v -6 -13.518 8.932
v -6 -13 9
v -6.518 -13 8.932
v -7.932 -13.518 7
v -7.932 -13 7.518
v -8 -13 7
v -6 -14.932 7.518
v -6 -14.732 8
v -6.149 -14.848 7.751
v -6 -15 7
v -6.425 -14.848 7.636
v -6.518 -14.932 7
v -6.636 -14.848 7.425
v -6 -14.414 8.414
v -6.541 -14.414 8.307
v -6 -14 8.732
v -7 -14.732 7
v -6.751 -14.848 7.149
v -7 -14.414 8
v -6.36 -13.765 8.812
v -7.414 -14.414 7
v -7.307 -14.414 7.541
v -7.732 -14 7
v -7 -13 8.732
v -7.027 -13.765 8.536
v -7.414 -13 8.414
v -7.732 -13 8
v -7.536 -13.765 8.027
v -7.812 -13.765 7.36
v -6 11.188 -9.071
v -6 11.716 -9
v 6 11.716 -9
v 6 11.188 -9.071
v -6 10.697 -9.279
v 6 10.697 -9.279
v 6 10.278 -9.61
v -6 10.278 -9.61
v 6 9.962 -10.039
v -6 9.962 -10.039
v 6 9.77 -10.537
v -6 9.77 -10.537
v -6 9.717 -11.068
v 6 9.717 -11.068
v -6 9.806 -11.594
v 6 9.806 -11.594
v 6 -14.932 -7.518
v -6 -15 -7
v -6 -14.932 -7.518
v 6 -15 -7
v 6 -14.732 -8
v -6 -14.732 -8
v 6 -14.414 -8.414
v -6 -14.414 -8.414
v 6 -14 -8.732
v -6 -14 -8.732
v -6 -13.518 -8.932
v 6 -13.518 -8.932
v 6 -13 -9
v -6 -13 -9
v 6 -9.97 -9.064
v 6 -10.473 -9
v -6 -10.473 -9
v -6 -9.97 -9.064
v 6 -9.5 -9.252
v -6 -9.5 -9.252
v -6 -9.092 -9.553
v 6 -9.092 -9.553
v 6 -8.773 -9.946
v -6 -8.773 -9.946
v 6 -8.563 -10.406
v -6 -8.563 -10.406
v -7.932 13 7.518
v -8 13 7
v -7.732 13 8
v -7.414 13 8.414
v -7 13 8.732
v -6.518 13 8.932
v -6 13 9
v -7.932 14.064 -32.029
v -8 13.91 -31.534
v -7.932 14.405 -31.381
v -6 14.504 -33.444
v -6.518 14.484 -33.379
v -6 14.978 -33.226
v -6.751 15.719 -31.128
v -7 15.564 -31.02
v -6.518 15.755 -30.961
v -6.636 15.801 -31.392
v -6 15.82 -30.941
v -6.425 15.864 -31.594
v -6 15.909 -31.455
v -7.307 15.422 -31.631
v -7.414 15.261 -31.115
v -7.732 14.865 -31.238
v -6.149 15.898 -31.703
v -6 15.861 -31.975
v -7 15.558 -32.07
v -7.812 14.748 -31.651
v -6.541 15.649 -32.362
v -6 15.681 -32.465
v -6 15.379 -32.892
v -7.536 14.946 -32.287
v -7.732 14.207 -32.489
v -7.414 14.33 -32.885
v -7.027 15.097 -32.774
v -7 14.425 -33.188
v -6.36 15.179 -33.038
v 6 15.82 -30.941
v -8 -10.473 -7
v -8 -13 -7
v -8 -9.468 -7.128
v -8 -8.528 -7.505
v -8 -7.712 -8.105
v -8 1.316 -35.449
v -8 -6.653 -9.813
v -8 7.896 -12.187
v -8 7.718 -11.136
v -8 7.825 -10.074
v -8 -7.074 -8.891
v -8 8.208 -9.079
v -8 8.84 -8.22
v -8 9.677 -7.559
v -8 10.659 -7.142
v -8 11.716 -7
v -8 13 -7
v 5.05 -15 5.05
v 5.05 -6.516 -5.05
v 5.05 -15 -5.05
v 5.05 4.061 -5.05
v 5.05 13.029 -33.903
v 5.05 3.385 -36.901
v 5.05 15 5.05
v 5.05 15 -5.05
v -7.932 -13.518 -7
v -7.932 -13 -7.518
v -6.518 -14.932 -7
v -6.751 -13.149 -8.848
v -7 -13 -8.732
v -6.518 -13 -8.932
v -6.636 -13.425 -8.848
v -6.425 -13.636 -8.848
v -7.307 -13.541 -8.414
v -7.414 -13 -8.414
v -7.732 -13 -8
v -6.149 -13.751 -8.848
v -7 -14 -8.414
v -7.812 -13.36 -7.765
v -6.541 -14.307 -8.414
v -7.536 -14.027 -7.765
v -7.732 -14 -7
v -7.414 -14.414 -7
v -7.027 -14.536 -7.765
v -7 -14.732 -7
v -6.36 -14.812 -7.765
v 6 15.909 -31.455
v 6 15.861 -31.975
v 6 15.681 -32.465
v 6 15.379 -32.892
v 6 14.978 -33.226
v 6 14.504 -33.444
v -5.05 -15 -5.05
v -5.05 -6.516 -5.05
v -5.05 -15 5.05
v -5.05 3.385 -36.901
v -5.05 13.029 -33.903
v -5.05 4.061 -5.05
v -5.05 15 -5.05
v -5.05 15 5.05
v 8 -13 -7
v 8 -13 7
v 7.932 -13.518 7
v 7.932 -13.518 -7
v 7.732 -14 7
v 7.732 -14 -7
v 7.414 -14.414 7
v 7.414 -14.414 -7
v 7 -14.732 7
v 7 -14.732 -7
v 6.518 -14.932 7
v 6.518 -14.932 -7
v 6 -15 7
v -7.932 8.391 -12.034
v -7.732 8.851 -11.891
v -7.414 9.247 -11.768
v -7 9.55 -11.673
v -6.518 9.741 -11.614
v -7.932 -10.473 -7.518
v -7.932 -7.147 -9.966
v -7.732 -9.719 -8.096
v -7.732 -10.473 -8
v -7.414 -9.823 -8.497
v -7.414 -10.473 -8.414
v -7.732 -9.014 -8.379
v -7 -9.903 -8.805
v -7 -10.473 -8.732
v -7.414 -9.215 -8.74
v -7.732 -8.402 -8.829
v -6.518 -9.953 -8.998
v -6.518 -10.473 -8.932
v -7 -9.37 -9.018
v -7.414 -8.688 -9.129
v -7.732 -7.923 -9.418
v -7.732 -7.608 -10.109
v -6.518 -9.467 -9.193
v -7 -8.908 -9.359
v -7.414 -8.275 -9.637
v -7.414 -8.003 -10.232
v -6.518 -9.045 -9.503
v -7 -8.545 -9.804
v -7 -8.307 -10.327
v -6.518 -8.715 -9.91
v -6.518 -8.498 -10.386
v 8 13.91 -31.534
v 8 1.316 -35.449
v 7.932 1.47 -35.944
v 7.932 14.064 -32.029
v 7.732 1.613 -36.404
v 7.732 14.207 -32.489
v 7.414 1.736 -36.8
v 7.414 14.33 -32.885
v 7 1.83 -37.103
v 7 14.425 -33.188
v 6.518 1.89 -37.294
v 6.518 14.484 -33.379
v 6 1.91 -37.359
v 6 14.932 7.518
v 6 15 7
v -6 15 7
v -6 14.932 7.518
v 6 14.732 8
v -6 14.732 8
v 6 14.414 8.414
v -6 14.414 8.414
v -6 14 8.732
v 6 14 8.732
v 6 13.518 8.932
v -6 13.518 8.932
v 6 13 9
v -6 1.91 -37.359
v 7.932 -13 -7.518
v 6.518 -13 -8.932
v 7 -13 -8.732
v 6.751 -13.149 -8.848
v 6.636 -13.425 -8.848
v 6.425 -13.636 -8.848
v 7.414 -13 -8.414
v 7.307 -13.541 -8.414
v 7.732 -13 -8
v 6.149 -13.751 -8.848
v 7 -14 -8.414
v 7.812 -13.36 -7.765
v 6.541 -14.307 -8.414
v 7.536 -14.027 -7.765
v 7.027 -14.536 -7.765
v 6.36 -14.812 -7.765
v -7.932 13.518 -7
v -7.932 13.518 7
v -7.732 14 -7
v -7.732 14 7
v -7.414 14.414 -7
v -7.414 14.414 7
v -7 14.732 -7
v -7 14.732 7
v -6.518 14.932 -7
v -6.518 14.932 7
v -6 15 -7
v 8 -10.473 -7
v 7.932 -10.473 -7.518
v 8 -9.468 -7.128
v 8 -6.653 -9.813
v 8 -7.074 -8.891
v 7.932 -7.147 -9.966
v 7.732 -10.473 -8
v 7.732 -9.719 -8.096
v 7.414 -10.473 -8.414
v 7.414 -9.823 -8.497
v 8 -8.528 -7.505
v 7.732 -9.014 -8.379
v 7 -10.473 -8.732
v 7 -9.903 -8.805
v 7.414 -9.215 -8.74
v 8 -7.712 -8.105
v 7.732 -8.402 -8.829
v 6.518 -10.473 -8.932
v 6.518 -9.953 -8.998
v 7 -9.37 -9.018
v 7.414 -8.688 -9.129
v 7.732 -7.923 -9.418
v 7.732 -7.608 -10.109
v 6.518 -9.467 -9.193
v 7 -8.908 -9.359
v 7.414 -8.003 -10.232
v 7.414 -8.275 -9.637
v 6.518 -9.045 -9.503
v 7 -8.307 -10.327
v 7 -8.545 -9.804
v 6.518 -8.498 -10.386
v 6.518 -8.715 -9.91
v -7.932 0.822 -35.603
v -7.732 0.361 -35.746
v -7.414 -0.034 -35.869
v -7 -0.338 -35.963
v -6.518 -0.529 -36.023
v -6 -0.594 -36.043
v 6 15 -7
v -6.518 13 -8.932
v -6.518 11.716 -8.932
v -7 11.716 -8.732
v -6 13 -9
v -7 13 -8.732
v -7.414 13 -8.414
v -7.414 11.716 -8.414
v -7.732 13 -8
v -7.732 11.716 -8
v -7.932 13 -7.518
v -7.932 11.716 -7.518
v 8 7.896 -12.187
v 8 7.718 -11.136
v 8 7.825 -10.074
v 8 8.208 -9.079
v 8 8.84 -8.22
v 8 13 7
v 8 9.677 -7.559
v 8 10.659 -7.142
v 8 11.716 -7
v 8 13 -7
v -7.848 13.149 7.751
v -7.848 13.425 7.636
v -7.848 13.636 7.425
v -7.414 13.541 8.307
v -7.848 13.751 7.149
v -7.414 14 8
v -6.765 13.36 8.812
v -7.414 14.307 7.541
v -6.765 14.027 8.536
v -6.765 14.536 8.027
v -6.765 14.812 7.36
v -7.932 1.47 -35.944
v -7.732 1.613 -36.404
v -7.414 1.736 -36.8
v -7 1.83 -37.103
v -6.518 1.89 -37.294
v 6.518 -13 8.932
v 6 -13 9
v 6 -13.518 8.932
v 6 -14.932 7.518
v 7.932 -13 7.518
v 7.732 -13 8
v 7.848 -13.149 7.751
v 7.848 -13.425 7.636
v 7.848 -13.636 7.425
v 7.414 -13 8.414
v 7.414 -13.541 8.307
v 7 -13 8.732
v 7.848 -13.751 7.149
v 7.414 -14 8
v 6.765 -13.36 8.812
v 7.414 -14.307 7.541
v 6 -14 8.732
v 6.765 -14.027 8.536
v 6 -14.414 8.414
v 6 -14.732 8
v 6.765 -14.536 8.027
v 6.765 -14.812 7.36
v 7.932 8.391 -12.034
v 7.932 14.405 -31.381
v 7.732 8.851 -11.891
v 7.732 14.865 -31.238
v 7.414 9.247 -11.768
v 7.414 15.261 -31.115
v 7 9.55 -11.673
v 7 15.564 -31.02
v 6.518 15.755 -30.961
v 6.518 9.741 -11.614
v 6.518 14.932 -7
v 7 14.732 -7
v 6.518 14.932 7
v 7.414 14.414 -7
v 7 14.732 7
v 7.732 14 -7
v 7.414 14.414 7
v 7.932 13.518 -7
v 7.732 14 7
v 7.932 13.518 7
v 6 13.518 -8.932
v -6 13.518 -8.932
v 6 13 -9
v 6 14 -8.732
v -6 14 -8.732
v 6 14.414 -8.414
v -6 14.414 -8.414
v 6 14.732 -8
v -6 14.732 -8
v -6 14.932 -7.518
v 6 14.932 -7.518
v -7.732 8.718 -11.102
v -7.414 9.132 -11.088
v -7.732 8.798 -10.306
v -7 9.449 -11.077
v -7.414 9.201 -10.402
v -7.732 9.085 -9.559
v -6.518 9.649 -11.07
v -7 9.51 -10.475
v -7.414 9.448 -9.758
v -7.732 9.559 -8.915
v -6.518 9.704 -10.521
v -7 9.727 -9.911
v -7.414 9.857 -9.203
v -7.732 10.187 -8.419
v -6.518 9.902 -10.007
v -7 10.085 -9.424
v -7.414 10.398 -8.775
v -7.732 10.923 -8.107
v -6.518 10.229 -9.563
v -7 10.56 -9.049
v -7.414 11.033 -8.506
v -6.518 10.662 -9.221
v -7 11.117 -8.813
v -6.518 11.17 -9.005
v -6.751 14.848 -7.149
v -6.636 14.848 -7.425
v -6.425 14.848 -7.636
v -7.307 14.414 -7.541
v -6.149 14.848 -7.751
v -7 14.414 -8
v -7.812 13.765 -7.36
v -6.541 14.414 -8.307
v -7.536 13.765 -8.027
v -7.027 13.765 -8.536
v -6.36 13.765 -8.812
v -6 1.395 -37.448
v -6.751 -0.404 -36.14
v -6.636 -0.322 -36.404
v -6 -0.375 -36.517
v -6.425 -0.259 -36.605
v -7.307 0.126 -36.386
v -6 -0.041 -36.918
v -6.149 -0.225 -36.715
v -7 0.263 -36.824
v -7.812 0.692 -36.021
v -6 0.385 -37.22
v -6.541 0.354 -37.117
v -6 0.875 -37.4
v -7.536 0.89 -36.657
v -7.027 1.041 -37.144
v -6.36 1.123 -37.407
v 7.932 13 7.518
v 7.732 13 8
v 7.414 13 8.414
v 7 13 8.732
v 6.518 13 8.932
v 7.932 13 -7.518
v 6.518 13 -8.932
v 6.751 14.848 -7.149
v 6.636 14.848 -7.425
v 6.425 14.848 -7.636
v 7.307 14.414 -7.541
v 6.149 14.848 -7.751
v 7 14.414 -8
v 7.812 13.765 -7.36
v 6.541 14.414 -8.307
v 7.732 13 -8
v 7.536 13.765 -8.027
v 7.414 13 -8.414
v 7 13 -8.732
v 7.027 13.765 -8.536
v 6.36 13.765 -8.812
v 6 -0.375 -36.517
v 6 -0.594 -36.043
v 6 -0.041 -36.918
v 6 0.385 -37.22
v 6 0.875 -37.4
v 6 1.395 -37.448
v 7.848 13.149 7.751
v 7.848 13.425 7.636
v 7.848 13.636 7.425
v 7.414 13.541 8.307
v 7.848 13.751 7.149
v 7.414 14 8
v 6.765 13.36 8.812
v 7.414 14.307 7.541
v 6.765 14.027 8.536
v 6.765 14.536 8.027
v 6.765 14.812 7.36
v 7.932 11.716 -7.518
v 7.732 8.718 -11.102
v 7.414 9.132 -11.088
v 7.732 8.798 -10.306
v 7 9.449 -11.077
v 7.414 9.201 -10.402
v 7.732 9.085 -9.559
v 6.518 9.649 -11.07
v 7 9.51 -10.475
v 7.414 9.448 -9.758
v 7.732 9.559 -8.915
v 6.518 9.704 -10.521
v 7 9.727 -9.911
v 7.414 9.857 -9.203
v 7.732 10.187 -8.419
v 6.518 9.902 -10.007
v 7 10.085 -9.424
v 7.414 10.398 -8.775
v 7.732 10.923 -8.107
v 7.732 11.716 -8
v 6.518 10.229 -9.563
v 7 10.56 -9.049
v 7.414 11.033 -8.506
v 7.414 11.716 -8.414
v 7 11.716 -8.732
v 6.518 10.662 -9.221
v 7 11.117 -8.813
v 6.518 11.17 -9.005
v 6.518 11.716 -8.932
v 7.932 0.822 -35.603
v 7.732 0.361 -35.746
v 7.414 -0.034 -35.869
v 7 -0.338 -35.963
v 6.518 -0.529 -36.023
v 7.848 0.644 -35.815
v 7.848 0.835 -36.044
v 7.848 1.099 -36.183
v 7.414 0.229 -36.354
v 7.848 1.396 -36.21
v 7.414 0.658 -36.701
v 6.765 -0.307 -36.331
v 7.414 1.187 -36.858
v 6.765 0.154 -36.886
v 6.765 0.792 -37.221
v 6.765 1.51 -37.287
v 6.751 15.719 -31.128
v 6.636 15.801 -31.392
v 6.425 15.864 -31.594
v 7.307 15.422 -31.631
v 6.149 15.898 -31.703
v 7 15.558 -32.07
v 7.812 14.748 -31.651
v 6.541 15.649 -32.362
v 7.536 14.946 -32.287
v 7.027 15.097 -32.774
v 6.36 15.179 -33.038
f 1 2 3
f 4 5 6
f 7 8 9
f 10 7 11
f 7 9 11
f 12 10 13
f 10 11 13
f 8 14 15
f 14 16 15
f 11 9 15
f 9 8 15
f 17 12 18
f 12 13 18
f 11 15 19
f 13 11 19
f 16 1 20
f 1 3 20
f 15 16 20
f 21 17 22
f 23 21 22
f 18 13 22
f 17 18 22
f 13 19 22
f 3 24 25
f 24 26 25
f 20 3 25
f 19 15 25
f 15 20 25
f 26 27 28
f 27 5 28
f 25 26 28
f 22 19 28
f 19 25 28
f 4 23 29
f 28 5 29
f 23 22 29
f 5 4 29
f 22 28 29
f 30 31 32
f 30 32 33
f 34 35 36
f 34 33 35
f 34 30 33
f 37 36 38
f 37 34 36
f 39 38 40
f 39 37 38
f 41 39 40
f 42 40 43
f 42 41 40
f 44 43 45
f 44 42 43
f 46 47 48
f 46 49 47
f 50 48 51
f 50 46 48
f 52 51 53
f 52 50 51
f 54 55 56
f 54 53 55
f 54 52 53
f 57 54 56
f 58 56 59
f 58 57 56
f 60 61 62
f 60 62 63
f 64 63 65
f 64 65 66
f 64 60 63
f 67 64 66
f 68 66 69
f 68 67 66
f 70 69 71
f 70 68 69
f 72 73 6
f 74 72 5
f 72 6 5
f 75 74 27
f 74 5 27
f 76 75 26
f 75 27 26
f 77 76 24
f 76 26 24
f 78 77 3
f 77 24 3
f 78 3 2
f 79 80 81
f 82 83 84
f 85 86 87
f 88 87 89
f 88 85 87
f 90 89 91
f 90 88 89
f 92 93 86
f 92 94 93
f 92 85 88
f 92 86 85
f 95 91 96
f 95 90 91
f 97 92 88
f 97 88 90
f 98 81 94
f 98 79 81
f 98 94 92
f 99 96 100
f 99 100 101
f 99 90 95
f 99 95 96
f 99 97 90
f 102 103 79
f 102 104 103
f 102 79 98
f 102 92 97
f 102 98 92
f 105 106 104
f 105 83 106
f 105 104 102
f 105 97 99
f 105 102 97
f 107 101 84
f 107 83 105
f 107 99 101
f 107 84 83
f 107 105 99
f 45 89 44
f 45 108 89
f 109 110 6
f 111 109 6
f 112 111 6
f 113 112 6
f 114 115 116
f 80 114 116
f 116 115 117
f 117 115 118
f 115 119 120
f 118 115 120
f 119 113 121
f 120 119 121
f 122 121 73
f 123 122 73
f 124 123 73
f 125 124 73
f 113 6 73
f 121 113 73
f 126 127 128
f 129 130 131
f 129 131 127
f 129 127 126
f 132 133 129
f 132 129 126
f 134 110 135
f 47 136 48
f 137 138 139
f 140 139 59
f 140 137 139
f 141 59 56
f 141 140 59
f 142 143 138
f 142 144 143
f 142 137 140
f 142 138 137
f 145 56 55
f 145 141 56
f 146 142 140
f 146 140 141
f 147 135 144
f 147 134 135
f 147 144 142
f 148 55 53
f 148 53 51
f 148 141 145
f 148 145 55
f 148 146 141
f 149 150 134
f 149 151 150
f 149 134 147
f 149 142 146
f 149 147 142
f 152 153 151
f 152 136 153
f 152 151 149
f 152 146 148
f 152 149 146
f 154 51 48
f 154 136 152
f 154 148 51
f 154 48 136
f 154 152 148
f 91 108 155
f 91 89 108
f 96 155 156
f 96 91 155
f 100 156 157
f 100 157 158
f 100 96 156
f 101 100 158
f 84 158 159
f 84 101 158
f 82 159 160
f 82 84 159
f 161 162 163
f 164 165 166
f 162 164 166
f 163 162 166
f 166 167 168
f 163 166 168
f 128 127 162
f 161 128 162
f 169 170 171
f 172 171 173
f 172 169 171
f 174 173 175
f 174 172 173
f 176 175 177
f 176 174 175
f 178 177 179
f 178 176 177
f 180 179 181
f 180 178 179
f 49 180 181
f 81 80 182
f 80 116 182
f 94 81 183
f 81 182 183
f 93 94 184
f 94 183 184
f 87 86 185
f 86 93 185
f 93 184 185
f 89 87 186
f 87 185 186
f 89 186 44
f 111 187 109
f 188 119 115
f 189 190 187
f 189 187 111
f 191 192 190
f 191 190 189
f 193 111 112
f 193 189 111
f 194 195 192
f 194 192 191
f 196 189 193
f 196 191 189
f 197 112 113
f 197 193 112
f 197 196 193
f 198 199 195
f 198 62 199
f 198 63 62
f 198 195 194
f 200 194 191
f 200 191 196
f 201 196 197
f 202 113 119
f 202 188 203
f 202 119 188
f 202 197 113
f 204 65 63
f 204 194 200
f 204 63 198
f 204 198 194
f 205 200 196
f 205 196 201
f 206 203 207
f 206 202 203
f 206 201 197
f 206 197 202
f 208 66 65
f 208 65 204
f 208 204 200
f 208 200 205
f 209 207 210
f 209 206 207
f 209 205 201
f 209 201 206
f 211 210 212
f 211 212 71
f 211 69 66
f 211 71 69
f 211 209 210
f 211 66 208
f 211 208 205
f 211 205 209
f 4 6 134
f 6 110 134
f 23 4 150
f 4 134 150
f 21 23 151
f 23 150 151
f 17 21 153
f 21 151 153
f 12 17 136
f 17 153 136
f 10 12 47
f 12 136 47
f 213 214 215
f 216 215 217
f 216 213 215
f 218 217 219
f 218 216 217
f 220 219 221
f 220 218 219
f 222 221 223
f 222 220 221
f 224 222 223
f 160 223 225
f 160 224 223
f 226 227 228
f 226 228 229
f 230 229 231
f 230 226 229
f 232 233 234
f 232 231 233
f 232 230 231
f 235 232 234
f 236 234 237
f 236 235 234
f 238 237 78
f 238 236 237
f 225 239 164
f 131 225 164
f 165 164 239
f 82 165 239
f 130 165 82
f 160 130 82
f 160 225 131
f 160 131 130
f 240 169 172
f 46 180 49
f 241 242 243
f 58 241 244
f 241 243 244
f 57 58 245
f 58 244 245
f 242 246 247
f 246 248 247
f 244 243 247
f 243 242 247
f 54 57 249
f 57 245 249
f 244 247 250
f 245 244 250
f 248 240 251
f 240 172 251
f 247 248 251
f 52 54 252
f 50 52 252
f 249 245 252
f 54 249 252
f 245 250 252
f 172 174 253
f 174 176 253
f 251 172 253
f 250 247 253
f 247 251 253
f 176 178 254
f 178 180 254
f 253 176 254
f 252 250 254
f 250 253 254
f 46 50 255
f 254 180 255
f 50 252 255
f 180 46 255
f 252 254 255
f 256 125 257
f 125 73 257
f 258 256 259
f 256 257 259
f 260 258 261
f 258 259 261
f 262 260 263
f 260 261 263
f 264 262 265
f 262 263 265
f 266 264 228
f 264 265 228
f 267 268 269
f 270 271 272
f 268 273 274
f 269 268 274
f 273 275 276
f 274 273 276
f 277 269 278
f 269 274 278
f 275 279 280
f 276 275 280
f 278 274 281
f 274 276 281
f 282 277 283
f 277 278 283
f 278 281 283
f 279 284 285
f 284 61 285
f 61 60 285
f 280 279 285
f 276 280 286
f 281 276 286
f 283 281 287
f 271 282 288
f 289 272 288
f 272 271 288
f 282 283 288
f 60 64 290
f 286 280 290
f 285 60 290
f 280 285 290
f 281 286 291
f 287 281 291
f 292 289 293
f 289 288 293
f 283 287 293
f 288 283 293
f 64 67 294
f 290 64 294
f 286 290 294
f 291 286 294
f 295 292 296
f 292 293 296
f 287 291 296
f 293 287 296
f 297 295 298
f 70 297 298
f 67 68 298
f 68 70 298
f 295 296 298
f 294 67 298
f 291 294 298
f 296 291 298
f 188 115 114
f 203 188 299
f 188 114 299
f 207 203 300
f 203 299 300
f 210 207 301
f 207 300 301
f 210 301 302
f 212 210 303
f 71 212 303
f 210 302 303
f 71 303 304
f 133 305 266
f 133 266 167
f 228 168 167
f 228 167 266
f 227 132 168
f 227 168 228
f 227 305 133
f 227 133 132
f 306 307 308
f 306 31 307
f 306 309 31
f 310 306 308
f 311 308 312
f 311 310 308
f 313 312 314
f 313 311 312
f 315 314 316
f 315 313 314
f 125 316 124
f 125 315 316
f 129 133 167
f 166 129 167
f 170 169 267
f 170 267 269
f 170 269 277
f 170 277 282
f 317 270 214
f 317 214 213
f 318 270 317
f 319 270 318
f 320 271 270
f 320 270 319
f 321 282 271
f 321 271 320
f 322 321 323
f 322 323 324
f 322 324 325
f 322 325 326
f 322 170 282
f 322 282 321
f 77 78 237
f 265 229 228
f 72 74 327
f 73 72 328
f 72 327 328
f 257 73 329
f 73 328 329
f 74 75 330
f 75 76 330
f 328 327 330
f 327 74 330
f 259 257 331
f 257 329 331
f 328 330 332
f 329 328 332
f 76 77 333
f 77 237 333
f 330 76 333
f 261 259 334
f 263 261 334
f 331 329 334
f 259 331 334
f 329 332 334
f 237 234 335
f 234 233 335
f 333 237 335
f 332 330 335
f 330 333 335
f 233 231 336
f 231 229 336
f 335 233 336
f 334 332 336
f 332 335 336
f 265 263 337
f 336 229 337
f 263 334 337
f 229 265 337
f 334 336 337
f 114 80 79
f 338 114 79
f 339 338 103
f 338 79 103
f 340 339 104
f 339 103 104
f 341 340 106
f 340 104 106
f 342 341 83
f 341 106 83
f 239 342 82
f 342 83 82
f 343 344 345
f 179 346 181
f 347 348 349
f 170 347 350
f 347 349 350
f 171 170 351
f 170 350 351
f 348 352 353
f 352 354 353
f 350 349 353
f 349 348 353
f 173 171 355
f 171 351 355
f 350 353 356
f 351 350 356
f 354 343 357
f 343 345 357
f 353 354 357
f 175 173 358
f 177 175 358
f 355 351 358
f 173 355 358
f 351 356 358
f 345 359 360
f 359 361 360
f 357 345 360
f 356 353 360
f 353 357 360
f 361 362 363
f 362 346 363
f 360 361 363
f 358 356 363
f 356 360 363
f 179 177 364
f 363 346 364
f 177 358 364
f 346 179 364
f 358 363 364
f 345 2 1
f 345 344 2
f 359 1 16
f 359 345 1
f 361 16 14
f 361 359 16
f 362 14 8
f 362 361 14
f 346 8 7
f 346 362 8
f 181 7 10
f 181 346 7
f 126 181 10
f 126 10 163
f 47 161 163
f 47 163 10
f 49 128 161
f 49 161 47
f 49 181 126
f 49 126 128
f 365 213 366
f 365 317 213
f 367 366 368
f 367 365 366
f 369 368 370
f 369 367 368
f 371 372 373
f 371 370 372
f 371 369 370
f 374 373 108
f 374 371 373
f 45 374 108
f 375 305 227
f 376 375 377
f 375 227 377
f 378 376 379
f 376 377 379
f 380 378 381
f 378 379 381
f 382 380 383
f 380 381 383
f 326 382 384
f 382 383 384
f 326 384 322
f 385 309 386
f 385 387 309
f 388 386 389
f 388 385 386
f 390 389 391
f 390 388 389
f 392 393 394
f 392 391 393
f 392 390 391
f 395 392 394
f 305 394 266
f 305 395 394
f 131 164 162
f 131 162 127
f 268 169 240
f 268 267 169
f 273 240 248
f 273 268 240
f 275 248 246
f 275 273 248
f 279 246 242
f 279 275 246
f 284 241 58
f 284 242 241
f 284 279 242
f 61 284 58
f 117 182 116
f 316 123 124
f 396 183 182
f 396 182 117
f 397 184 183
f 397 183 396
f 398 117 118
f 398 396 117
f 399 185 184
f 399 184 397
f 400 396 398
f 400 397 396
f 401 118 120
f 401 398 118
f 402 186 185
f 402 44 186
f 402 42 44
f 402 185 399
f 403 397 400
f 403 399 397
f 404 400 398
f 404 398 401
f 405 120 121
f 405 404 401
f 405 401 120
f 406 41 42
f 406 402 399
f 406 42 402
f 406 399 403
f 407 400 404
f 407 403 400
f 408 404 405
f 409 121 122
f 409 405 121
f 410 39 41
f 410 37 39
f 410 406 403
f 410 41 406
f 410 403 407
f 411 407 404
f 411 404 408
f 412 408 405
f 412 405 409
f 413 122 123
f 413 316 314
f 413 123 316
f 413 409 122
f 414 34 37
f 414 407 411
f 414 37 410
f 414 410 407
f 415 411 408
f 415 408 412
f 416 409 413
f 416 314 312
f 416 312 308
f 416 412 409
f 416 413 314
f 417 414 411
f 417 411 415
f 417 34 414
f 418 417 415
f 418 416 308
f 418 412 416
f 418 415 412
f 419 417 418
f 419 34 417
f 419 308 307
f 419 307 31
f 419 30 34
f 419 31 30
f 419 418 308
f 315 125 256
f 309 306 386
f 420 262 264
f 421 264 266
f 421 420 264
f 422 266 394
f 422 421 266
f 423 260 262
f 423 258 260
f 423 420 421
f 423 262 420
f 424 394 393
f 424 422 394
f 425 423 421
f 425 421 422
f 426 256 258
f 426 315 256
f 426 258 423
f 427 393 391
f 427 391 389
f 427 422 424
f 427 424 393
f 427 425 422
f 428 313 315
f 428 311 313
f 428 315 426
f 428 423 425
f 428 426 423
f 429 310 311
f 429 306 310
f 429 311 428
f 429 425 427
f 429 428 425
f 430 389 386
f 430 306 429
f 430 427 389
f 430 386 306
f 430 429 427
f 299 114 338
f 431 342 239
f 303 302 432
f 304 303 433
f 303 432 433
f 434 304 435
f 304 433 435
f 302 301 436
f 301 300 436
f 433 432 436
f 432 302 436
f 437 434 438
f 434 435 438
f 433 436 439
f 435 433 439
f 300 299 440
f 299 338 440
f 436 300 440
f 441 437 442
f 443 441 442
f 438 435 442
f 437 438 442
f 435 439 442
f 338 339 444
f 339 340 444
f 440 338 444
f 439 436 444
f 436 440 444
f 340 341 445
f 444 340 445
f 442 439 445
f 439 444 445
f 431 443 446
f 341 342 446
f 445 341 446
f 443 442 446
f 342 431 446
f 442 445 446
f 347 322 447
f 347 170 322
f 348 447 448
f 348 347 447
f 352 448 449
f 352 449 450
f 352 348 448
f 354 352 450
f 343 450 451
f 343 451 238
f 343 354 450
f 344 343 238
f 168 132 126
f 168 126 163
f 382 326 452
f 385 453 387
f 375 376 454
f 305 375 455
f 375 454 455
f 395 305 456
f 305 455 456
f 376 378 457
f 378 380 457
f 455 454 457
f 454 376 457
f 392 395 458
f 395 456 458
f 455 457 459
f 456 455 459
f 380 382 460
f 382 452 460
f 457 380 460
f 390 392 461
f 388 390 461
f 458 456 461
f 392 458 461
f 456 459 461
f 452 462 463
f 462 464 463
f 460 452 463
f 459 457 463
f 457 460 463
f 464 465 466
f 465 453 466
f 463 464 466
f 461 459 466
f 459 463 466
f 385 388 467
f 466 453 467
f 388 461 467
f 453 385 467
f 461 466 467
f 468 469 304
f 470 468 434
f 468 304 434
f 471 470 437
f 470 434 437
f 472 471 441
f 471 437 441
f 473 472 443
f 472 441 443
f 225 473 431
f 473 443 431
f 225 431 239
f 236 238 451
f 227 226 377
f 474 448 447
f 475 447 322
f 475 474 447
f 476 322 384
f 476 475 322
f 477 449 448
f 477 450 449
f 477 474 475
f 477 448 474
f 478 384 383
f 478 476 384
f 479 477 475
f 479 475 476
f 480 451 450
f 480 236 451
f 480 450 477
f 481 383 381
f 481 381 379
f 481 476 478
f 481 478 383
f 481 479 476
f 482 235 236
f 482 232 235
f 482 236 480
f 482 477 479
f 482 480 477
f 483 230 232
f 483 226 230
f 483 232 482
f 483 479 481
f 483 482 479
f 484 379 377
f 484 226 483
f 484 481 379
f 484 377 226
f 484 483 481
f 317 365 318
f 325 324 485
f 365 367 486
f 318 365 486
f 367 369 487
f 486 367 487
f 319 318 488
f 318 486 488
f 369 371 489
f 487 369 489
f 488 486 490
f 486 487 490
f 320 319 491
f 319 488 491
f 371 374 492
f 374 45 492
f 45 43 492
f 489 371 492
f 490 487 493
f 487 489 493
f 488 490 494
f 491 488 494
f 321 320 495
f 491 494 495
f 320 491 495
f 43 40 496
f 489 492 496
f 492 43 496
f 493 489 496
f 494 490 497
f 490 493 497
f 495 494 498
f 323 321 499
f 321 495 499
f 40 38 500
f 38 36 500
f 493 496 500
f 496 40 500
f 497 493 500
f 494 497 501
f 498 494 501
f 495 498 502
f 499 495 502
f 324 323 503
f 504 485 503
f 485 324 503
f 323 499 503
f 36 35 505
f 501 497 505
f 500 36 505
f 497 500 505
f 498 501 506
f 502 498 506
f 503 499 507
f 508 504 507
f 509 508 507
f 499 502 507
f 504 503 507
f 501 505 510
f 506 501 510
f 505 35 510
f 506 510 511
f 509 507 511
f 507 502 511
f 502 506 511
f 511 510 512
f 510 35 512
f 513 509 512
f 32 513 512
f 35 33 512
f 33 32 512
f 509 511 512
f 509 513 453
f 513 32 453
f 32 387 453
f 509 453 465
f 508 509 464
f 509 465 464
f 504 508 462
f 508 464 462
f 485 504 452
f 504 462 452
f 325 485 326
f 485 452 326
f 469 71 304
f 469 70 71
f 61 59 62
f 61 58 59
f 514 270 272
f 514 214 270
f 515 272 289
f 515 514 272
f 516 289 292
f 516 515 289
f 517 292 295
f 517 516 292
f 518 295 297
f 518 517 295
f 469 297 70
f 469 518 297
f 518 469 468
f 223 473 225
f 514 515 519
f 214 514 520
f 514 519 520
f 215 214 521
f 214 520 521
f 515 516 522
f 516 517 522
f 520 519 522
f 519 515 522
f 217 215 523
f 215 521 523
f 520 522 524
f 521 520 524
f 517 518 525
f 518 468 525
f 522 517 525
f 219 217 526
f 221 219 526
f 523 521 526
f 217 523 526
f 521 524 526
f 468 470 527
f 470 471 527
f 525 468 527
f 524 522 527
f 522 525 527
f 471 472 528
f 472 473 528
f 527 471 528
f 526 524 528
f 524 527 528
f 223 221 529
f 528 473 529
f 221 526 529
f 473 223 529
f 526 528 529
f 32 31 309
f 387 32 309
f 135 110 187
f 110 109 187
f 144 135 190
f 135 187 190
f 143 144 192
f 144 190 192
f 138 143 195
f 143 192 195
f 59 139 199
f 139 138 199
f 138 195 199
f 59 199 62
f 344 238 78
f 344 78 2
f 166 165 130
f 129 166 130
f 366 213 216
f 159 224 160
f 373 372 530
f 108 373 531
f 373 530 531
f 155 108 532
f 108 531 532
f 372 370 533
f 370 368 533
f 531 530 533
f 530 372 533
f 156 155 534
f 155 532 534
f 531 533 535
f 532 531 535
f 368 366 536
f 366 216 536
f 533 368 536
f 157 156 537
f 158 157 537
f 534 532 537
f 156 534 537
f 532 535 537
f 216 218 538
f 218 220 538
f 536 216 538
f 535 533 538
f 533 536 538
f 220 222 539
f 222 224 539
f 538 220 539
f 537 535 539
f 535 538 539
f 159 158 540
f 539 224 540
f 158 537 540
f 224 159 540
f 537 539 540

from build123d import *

# Parameters (mm, degrees)
F1_DEPTH = 8
F2_W     = 10.1
F2_H     = 10.1
F3_DEPTH = 30
F4_W     = 10.1
F4_H     = 10.1
F5_DEPTH = 33.3550908792
F6_R     = 2


with BuildPart() as f1:
    # F0 (on Right) → F1 (new body, symmetric)
    with BuildSketch(Plane.YZ):
        Polygon((9, -9), (15, -9), (15, 9), (-15, 9), (-15, -9), (-9, -9), (0, -37.9528366029), (16.4139532903, -32.8505531328), align=None)
    extrude(amount=F1_DEPTH, both=True)

    # F2 (on face) → F3 (cut, through all)
    with BuildSketch(Plane(origin=(0, 15, 0), x_dir=(-1, 0, 0), z_dir=(0, 1, 0))):
        Rectangle(F2_W, F2_H)
    extrude(amount=-F3_DEPTH, mode=Mode.SUBTRACT)

    # F4 (on face) → F5 (cut, through all)
    with BuildSketch(Plane(origin=(0, 10.7581183802, -34.608671513), x_dir=(1, 0, 0), z_dir=(0, 0.2968395292, -0.9549273762))):
        with Locations((0, 2.6715557628)):
            Rectangle(F4_W, F4_H)
    extrude(amount=-F5_DEPTH, mode=Mode.SUBTRACT)

    # F6
    f6_edges = [f1.edges().sort_by_distance(p)[0] for p in [
        (0, 15, 9),
        (-8, 0, 9),
        (0, -15, 9),
        (8, 0, 9),
        (-8, 8.206977, -35.401695),
        (-8, 12.706977, -20.925277),
        (-8, 12, -9),
        (-8, 15, 0),
        (-8, -15, 0),
        (-8, -12, -9),
        (-8, -4.5, -23.476418),
        (0, 0, -37.952837),
        (8, -4.5, -23.476418),
        (0, -9, -9),
        (8, 8.206977, -35.401695),
        (8, 12.706977, -20.925277),
        (8, 12, -9),
        (8, 15, 0),
        (8, -15, 0),
        (8, -12, -9),
        (0, 16.413953, -32.850553),
        (0, 9, -9),
        (0, 15, -9),
        (0, -15, -9),
    ]]
    fillet(f6_edges, radius=F6_R)


solid = f1.part
